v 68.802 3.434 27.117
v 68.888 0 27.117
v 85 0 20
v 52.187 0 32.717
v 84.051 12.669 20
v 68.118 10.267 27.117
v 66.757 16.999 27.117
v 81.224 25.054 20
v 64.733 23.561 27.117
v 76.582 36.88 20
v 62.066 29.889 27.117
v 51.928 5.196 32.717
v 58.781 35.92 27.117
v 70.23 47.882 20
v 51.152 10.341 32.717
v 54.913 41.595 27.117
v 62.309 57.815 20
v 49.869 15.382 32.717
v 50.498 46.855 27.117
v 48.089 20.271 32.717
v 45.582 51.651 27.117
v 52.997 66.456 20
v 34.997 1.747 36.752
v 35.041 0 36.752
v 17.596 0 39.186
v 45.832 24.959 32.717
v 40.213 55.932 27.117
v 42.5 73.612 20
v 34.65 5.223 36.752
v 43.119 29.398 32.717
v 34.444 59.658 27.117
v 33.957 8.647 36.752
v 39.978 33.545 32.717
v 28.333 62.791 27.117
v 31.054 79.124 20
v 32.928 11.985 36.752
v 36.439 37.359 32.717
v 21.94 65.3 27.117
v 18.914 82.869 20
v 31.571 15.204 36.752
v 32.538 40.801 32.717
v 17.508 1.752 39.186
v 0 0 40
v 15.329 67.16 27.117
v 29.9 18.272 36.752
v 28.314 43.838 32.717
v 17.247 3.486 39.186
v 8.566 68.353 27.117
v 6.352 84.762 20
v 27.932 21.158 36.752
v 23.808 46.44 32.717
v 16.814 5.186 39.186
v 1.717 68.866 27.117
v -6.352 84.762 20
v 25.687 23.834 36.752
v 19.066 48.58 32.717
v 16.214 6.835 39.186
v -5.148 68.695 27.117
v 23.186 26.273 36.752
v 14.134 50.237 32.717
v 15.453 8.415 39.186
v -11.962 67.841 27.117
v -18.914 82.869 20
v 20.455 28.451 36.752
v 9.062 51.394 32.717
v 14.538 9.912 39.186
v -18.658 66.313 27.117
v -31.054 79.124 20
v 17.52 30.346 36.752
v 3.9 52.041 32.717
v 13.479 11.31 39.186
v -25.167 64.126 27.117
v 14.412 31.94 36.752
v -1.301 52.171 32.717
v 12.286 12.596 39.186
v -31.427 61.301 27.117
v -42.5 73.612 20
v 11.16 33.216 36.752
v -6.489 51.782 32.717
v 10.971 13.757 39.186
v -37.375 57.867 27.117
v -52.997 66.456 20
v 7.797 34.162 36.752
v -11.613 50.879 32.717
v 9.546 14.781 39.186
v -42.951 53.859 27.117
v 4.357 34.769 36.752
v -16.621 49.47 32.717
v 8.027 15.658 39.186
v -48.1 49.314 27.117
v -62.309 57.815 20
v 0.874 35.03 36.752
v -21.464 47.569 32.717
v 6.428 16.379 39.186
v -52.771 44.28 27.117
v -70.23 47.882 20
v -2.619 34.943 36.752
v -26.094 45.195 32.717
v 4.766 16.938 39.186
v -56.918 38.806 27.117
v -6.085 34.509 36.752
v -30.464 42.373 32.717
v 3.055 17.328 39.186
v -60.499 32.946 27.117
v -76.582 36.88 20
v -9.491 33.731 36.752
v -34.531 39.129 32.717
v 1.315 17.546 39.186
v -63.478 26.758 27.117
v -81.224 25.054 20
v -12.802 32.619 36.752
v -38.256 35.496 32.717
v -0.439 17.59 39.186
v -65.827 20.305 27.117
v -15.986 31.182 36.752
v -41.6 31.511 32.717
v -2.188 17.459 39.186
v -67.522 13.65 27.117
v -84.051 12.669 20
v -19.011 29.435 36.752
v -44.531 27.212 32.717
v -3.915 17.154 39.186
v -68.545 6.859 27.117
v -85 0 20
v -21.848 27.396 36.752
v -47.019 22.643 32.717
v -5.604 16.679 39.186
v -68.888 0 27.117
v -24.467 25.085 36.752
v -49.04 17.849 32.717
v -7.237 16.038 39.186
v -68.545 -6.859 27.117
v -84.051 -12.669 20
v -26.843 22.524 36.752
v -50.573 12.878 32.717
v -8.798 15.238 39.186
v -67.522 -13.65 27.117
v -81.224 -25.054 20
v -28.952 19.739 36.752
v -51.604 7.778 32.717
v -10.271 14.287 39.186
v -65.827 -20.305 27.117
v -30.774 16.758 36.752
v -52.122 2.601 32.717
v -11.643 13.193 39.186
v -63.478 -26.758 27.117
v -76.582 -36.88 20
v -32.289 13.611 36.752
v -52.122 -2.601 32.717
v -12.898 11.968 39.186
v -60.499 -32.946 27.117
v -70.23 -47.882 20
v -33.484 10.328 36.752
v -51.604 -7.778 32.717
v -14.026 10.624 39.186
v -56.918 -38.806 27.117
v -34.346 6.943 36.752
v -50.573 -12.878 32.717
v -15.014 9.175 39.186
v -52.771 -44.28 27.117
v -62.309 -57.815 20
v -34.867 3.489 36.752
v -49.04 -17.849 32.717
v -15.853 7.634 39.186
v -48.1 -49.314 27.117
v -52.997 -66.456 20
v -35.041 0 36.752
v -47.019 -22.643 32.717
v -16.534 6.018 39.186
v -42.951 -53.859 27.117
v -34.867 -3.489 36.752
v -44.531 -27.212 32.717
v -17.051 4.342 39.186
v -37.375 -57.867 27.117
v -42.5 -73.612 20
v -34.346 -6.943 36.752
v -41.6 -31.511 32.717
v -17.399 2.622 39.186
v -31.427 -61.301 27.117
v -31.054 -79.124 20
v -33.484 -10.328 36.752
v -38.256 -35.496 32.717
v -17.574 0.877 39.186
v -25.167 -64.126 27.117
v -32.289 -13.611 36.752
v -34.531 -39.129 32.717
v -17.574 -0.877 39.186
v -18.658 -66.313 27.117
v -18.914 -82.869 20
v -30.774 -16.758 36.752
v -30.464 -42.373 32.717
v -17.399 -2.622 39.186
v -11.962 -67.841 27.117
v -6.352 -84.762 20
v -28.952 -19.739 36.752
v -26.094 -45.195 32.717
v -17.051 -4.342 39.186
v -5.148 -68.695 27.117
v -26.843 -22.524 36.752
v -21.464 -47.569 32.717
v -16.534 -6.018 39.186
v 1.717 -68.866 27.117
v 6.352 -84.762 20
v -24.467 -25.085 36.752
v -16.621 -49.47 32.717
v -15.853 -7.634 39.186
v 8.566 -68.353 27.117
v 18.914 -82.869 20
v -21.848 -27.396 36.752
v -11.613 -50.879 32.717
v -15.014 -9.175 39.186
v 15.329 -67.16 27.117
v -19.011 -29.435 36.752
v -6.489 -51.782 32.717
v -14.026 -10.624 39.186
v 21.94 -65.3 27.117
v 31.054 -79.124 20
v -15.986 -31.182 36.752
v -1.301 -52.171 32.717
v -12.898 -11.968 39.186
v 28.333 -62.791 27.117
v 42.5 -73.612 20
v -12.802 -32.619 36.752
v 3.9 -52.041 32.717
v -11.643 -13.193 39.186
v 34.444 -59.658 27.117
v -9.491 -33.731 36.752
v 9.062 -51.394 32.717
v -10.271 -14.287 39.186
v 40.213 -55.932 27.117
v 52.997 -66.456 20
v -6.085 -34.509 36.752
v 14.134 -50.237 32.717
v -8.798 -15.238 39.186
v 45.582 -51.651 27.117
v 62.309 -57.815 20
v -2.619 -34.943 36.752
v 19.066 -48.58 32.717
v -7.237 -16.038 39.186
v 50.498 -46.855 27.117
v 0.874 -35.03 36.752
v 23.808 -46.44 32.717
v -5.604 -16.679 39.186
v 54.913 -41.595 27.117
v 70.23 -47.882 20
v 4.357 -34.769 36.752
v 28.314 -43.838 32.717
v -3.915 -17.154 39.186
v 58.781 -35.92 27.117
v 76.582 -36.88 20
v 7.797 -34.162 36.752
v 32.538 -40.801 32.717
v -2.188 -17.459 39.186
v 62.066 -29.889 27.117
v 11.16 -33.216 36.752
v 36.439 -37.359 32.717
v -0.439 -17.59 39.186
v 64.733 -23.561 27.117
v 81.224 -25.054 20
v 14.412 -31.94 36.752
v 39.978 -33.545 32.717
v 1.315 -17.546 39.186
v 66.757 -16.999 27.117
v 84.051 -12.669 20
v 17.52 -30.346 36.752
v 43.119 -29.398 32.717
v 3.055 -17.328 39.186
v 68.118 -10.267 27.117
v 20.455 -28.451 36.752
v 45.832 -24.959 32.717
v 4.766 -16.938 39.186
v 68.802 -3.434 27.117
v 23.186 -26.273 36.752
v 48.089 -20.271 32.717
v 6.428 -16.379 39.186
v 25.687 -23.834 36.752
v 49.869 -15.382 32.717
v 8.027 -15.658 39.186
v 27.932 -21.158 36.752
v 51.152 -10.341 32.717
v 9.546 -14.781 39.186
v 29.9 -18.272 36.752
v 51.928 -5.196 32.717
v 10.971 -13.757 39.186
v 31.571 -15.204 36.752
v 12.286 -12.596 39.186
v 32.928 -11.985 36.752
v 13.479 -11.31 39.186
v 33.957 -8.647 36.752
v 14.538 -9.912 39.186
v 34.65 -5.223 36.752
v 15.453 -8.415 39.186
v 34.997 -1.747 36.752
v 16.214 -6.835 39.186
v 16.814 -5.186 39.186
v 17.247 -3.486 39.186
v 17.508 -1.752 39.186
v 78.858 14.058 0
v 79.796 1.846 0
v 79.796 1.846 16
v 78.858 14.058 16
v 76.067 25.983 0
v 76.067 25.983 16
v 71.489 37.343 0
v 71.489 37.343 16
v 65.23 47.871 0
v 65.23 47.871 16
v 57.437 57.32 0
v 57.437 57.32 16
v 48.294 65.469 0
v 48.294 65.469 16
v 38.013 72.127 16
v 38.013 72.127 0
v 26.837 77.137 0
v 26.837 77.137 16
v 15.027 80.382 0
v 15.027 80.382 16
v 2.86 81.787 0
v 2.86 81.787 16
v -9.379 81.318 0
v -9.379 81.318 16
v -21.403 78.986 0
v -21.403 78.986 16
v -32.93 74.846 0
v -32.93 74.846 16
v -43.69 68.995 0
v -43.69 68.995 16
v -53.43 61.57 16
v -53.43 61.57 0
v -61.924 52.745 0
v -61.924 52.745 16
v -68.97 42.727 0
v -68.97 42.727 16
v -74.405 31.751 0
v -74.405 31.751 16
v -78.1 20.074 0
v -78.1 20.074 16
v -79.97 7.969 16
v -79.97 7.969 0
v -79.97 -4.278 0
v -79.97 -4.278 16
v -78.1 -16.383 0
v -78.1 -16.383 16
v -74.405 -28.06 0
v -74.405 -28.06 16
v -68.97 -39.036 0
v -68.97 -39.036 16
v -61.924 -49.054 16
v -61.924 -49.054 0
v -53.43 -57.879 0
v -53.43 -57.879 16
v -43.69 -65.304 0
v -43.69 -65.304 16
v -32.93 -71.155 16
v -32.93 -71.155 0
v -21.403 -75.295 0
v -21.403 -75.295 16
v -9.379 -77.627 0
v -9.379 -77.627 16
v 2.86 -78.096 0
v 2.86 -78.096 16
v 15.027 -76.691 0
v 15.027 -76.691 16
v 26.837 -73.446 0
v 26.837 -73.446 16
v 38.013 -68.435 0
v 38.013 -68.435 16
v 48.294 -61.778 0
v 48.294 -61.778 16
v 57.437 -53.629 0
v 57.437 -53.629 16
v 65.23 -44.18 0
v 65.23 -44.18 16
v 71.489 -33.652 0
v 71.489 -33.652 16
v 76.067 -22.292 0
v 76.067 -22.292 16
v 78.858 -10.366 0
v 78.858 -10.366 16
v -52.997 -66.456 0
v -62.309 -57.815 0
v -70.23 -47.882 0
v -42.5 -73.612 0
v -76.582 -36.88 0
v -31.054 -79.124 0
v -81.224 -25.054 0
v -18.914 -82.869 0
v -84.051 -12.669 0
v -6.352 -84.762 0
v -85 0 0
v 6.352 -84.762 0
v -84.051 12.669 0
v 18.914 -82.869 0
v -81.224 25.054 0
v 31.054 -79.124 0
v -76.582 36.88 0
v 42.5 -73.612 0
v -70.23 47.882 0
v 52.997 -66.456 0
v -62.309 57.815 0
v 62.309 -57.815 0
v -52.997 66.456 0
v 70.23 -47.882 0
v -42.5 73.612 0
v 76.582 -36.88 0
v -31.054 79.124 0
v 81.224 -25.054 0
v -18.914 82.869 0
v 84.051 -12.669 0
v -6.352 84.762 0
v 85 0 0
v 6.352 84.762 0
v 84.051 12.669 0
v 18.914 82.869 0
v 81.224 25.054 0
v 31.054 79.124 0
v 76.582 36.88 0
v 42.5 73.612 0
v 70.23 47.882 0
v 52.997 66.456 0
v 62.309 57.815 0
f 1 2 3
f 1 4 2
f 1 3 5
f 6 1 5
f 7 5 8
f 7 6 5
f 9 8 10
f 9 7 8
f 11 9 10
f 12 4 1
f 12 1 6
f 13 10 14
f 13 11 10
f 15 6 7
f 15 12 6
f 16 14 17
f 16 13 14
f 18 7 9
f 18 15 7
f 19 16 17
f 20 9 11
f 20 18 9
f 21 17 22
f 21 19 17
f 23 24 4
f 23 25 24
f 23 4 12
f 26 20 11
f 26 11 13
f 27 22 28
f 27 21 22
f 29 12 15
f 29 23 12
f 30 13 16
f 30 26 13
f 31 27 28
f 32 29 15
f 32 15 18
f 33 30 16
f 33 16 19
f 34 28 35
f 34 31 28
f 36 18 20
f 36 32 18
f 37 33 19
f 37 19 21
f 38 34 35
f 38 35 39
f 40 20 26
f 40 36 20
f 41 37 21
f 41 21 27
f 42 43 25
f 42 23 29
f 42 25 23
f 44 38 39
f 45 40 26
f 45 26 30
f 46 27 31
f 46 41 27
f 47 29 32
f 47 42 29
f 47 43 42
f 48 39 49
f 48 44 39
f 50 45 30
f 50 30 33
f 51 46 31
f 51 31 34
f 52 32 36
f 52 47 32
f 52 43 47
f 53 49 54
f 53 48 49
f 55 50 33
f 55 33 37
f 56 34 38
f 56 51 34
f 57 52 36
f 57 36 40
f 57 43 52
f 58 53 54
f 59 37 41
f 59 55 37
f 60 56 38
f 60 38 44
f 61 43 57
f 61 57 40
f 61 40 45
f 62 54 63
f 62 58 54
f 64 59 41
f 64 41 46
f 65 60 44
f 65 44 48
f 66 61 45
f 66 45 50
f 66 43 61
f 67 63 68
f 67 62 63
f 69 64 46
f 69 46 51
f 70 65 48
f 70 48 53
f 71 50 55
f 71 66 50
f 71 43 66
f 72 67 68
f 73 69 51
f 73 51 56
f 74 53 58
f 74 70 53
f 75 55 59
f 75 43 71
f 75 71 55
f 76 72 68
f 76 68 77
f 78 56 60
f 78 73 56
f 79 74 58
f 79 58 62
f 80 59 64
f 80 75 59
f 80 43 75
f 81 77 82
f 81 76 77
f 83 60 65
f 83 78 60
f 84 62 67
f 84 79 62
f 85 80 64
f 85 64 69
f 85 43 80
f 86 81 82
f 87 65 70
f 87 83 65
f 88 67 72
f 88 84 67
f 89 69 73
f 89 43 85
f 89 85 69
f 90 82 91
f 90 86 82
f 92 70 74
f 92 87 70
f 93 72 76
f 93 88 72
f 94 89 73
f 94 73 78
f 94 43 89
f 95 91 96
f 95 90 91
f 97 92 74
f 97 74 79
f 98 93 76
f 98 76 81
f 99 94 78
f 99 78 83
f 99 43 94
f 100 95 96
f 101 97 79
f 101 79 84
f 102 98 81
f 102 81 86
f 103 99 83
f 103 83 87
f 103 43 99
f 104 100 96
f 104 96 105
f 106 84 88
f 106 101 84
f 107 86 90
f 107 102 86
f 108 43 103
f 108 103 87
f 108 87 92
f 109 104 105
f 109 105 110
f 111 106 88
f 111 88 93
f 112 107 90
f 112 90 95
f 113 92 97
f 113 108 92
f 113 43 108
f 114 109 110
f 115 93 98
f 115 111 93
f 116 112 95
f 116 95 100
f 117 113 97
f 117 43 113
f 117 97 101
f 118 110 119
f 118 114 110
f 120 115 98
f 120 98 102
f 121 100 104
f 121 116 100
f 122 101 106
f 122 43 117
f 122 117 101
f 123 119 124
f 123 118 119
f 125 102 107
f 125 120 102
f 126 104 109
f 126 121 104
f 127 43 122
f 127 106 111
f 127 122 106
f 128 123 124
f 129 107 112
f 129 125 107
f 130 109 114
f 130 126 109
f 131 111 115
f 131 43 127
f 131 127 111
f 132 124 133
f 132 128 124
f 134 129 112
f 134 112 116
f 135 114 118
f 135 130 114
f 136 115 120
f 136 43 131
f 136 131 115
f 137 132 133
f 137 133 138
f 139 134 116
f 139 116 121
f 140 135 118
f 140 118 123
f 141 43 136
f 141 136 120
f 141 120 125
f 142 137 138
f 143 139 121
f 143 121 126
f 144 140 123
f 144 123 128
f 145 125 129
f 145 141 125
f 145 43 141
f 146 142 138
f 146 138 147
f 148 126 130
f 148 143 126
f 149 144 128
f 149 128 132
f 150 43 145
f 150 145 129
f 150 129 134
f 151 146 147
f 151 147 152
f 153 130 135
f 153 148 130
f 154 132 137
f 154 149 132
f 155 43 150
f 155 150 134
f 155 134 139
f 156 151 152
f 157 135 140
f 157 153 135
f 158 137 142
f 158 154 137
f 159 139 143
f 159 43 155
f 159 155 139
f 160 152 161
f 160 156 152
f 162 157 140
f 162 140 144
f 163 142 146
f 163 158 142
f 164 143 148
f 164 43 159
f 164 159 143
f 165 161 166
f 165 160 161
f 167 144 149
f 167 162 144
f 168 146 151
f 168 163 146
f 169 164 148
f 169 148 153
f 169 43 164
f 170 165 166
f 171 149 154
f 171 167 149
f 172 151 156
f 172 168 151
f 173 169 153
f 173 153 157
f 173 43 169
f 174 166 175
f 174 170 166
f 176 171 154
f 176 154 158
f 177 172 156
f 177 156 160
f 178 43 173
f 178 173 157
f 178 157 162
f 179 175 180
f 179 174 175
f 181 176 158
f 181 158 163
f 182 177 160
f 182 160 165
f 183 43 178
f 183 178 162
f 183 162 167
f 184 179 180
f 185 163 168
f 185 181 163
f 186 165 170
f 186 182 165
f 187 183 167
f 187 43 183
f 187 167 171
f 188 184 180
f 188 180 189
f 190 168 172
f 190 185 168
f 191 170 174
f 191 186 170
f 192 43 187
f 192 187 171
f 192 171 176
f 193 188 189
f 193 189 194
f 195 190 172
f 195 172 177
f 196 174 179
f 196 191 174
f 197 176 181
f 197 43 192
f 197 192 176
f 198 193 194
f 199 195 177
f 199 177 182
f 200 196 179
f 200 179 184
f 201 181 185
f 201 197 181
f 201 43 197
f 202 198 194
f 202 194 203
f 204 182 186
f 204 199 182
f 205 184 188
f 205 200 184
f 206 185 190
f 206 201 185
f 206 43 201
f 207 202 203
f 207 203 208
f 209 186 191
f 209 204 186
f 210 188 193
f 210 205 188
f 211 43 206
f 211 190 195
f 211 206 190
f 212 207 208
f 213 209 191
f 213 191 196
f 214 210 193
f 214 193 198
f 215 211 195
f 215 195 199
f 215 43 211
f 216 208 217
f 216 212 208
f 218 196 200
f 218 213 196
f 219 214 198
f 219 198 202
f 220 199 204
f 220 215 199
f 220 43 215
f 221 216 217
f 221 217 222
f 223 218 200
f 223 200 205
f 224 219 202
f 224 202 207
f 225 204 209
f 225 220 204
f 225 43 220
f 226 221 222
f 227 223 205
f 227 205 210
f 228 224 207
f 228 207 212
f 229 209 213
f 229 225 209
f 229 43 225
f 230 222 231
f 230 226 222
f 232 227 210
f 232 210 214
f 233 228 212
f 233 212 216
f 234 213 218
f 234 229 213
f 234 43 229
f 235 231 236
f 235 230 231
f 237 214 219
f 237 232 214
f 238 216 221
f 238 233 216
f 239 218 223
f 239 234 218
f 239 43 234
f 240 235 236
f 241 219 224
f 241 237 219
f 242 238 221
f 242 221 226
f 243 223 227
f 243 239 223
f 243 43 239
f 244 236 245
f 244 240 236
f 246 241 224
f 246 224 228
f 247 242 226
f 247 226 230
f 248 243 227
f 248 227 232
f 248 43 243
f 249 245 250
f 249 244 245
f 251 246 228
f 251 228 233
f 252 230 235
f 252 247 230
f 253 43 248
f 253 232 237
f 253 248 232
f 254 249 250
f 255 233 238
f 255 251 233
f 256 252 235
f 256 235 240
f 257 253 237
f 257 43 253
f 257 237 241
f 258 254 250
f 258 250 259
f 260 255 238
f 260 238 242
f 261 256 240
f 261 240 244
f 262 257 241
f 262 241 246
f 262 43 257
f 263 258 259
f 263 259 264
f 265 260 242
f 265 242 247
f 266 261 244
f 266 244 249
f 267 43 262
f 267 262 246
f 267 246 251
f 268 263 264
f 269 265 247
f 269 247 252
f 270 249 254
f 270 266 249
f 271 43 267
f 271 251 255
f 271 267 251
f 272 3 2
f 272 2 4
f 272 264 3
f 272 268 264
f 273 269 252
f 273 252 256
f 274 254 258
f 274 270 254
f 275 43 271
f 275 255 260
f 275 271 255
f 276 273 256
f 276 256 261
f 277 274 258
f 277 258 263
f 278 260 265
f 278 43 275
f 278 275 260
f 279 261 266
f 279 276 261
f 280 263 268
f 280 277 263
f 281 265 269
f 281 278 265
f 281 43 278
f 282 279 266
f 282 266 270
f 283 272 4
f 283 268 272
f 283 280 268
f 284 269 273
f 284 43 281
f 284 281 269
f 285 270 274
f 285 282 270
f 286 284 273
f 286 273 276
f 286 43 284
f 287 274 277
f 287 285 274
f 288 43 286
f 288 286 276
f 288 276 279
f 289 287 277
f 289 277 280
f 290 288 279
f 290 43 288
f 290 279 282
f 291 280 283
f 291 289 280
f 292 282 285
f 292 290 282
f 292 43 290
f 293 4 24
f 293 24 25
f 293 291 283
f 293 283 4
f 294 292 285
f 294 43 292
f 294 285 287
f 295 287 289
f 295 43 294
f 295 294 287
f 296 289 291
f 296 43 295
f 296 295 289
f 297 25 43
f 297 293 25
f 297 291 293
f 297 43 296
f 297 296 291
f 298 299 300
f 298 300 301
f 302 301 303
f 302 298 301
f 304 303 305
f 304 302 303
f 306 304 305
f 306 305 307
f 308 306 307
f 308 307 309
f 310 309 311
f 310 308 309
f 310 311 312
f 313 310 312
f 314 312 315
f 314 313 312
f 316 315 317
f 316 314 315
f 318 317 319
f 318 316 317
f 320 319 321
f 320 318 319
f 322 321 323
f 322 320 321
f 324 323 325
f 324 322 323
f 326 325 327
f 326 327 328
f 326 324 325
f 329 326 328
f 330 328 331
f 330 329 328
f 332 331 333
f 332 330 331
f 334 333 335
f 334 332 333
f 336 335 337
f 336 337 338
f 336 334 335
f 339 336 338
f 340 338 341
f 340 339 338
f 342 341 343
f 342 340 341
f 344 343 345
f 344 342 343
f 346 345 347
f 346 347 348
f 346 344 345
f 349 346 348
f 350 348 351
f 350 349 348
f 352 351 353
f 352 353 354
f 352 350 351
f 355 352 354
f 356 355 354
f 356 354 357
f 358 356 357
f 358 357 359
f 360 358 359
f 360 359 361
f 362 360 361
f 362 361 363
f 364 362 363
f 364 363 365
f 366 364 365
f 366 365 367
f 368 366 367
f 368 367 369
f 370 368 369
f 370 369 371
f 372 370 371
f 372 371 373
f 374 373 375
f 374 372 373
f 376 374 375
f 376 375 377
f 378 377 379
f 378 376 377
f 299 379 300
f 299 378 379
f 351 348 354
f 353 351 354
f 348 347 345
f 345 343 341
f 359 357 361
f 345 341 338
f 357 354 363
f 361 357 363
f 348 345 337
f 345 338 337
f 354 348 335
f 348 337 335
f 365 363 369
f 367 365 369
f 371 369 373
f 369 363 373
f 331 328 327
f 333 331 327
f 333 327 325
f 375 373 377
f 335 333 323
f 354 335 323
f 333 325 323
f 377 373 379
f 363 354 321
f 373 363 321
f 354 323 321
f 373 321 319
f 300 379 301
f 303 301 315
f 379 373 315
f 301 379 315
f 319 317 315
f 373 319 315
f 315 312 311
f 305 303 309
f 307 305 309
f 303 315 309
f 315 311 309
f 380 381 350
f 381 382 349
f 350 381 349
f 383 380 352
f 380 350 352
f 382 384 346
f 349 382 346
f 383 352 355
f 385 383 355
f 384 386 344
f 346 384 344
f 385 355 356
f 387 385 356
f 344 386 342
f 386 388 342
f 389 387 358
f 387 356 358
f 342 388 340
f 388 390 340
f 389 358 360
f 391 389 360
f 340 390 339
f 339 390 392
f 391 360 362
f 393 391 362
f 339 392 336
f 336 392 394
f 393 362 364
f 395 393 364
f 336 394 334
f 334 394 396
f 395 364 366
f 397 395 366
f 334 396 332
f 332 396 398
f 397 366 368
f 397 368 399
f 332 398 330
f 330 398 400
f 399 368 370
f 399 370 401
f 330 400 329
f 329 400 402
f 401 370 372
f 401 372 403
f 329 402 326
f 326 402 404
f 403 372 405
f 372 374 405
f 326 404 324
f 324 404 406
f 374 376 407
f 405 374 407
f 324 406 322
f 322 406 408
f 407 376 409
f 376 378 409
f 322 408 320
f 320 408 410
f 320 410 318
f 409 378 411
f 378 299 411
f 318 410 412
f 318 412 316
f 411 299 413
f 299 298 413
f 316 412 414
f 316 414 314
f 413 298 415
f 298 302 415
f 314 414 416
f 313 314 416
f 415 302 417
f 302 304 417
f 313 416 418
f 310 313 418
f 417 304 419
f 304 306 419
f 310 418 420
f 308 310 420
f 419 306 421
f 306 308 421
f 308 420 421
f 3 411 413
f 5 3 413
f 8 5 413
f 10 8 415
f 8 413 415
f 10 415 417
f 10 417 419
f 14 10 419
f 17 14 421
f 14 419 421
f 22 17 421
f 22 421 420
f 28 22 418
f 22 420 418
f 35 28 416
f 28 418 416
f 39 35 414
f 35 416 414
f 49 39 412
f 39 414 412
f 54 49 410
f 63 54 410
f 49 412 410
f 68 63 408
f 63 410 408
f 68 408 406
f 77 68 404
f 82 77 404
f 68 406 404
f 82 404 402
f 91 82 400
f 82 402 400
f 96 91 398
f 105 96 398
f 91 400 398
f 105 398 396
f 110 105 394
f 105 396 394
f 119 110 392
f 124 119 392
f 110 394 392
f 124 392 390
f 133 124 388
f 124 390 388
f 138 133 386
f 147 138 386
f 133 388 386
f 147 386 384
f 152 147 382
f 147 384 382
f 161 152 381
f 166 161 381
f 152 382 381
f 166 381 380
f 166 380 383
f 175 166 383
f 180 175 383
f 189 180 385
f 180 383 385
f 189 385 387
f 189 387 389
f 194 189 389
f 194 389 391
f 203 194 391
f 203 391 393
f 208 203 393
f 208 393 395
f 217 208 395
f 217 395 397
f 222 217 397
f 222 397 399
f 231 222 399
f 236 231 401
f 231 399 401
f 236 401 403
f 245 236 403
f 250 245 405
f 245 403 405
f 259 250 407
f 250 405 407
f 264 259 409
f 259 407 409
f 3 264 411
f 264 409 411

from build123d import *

# Parameters (mm, degrees)
SKETCH8_R           = 85
BOSS_EXTRUDE5_DEPTH = 20
DOME4_FACE_RADIUS   = 85
DOME4_HEIGHT        = 20
HOLE5_OUTLINE_R     = 80
HOLE5_DEPTH         = 16


# Read off the part's stored shape, not the designer's step: Hole5
with BuildPart() as part:
    # Sketch8 → Boss-Extrude5 (new body)
    with BuildSketch(Plane.XY):
        Circle(SKETCH8_R)
    extrude(amount=BOSS_EXTRUDE5_DEPTH)

    # Dome4: a dome of height H over a round flat face of radius A is a cap of a sphere of radius (A * A + H * H) / (2 * H)
    dome4_r = (DOME4_FACE_RADIUS * DOME4_FACE_RADIUS + DOME4_HEIGHT * DOME4_HEIGHT) / (2 * DOME4_HEIGHT)
    dome4_base = Plane((0, 0, 20), z_dir=(0, 0, 1))
    with Locations(dome4_base.offset(DOME4_HEIGHT - dome4_r)):
        dome4_ball = Sphere(dome4_r, mode=Mode.PRIVATE)
    add(split(dome4_ball, bisect_by=dome4_base, keep=Keep.TOP, mode=Mode.PRIVATE))

    # Hole5 outline → Hole5 (cut)
    with BuildSketch(Plane.XY):
        with Locations((-0.204435363, 1.845559102)):
            Circle(HOLE5_OUTLINE_R)
    extrude(amount=HOLE5_DEPTH, mode=Mode.SUBTRACT)


solid = part.part
